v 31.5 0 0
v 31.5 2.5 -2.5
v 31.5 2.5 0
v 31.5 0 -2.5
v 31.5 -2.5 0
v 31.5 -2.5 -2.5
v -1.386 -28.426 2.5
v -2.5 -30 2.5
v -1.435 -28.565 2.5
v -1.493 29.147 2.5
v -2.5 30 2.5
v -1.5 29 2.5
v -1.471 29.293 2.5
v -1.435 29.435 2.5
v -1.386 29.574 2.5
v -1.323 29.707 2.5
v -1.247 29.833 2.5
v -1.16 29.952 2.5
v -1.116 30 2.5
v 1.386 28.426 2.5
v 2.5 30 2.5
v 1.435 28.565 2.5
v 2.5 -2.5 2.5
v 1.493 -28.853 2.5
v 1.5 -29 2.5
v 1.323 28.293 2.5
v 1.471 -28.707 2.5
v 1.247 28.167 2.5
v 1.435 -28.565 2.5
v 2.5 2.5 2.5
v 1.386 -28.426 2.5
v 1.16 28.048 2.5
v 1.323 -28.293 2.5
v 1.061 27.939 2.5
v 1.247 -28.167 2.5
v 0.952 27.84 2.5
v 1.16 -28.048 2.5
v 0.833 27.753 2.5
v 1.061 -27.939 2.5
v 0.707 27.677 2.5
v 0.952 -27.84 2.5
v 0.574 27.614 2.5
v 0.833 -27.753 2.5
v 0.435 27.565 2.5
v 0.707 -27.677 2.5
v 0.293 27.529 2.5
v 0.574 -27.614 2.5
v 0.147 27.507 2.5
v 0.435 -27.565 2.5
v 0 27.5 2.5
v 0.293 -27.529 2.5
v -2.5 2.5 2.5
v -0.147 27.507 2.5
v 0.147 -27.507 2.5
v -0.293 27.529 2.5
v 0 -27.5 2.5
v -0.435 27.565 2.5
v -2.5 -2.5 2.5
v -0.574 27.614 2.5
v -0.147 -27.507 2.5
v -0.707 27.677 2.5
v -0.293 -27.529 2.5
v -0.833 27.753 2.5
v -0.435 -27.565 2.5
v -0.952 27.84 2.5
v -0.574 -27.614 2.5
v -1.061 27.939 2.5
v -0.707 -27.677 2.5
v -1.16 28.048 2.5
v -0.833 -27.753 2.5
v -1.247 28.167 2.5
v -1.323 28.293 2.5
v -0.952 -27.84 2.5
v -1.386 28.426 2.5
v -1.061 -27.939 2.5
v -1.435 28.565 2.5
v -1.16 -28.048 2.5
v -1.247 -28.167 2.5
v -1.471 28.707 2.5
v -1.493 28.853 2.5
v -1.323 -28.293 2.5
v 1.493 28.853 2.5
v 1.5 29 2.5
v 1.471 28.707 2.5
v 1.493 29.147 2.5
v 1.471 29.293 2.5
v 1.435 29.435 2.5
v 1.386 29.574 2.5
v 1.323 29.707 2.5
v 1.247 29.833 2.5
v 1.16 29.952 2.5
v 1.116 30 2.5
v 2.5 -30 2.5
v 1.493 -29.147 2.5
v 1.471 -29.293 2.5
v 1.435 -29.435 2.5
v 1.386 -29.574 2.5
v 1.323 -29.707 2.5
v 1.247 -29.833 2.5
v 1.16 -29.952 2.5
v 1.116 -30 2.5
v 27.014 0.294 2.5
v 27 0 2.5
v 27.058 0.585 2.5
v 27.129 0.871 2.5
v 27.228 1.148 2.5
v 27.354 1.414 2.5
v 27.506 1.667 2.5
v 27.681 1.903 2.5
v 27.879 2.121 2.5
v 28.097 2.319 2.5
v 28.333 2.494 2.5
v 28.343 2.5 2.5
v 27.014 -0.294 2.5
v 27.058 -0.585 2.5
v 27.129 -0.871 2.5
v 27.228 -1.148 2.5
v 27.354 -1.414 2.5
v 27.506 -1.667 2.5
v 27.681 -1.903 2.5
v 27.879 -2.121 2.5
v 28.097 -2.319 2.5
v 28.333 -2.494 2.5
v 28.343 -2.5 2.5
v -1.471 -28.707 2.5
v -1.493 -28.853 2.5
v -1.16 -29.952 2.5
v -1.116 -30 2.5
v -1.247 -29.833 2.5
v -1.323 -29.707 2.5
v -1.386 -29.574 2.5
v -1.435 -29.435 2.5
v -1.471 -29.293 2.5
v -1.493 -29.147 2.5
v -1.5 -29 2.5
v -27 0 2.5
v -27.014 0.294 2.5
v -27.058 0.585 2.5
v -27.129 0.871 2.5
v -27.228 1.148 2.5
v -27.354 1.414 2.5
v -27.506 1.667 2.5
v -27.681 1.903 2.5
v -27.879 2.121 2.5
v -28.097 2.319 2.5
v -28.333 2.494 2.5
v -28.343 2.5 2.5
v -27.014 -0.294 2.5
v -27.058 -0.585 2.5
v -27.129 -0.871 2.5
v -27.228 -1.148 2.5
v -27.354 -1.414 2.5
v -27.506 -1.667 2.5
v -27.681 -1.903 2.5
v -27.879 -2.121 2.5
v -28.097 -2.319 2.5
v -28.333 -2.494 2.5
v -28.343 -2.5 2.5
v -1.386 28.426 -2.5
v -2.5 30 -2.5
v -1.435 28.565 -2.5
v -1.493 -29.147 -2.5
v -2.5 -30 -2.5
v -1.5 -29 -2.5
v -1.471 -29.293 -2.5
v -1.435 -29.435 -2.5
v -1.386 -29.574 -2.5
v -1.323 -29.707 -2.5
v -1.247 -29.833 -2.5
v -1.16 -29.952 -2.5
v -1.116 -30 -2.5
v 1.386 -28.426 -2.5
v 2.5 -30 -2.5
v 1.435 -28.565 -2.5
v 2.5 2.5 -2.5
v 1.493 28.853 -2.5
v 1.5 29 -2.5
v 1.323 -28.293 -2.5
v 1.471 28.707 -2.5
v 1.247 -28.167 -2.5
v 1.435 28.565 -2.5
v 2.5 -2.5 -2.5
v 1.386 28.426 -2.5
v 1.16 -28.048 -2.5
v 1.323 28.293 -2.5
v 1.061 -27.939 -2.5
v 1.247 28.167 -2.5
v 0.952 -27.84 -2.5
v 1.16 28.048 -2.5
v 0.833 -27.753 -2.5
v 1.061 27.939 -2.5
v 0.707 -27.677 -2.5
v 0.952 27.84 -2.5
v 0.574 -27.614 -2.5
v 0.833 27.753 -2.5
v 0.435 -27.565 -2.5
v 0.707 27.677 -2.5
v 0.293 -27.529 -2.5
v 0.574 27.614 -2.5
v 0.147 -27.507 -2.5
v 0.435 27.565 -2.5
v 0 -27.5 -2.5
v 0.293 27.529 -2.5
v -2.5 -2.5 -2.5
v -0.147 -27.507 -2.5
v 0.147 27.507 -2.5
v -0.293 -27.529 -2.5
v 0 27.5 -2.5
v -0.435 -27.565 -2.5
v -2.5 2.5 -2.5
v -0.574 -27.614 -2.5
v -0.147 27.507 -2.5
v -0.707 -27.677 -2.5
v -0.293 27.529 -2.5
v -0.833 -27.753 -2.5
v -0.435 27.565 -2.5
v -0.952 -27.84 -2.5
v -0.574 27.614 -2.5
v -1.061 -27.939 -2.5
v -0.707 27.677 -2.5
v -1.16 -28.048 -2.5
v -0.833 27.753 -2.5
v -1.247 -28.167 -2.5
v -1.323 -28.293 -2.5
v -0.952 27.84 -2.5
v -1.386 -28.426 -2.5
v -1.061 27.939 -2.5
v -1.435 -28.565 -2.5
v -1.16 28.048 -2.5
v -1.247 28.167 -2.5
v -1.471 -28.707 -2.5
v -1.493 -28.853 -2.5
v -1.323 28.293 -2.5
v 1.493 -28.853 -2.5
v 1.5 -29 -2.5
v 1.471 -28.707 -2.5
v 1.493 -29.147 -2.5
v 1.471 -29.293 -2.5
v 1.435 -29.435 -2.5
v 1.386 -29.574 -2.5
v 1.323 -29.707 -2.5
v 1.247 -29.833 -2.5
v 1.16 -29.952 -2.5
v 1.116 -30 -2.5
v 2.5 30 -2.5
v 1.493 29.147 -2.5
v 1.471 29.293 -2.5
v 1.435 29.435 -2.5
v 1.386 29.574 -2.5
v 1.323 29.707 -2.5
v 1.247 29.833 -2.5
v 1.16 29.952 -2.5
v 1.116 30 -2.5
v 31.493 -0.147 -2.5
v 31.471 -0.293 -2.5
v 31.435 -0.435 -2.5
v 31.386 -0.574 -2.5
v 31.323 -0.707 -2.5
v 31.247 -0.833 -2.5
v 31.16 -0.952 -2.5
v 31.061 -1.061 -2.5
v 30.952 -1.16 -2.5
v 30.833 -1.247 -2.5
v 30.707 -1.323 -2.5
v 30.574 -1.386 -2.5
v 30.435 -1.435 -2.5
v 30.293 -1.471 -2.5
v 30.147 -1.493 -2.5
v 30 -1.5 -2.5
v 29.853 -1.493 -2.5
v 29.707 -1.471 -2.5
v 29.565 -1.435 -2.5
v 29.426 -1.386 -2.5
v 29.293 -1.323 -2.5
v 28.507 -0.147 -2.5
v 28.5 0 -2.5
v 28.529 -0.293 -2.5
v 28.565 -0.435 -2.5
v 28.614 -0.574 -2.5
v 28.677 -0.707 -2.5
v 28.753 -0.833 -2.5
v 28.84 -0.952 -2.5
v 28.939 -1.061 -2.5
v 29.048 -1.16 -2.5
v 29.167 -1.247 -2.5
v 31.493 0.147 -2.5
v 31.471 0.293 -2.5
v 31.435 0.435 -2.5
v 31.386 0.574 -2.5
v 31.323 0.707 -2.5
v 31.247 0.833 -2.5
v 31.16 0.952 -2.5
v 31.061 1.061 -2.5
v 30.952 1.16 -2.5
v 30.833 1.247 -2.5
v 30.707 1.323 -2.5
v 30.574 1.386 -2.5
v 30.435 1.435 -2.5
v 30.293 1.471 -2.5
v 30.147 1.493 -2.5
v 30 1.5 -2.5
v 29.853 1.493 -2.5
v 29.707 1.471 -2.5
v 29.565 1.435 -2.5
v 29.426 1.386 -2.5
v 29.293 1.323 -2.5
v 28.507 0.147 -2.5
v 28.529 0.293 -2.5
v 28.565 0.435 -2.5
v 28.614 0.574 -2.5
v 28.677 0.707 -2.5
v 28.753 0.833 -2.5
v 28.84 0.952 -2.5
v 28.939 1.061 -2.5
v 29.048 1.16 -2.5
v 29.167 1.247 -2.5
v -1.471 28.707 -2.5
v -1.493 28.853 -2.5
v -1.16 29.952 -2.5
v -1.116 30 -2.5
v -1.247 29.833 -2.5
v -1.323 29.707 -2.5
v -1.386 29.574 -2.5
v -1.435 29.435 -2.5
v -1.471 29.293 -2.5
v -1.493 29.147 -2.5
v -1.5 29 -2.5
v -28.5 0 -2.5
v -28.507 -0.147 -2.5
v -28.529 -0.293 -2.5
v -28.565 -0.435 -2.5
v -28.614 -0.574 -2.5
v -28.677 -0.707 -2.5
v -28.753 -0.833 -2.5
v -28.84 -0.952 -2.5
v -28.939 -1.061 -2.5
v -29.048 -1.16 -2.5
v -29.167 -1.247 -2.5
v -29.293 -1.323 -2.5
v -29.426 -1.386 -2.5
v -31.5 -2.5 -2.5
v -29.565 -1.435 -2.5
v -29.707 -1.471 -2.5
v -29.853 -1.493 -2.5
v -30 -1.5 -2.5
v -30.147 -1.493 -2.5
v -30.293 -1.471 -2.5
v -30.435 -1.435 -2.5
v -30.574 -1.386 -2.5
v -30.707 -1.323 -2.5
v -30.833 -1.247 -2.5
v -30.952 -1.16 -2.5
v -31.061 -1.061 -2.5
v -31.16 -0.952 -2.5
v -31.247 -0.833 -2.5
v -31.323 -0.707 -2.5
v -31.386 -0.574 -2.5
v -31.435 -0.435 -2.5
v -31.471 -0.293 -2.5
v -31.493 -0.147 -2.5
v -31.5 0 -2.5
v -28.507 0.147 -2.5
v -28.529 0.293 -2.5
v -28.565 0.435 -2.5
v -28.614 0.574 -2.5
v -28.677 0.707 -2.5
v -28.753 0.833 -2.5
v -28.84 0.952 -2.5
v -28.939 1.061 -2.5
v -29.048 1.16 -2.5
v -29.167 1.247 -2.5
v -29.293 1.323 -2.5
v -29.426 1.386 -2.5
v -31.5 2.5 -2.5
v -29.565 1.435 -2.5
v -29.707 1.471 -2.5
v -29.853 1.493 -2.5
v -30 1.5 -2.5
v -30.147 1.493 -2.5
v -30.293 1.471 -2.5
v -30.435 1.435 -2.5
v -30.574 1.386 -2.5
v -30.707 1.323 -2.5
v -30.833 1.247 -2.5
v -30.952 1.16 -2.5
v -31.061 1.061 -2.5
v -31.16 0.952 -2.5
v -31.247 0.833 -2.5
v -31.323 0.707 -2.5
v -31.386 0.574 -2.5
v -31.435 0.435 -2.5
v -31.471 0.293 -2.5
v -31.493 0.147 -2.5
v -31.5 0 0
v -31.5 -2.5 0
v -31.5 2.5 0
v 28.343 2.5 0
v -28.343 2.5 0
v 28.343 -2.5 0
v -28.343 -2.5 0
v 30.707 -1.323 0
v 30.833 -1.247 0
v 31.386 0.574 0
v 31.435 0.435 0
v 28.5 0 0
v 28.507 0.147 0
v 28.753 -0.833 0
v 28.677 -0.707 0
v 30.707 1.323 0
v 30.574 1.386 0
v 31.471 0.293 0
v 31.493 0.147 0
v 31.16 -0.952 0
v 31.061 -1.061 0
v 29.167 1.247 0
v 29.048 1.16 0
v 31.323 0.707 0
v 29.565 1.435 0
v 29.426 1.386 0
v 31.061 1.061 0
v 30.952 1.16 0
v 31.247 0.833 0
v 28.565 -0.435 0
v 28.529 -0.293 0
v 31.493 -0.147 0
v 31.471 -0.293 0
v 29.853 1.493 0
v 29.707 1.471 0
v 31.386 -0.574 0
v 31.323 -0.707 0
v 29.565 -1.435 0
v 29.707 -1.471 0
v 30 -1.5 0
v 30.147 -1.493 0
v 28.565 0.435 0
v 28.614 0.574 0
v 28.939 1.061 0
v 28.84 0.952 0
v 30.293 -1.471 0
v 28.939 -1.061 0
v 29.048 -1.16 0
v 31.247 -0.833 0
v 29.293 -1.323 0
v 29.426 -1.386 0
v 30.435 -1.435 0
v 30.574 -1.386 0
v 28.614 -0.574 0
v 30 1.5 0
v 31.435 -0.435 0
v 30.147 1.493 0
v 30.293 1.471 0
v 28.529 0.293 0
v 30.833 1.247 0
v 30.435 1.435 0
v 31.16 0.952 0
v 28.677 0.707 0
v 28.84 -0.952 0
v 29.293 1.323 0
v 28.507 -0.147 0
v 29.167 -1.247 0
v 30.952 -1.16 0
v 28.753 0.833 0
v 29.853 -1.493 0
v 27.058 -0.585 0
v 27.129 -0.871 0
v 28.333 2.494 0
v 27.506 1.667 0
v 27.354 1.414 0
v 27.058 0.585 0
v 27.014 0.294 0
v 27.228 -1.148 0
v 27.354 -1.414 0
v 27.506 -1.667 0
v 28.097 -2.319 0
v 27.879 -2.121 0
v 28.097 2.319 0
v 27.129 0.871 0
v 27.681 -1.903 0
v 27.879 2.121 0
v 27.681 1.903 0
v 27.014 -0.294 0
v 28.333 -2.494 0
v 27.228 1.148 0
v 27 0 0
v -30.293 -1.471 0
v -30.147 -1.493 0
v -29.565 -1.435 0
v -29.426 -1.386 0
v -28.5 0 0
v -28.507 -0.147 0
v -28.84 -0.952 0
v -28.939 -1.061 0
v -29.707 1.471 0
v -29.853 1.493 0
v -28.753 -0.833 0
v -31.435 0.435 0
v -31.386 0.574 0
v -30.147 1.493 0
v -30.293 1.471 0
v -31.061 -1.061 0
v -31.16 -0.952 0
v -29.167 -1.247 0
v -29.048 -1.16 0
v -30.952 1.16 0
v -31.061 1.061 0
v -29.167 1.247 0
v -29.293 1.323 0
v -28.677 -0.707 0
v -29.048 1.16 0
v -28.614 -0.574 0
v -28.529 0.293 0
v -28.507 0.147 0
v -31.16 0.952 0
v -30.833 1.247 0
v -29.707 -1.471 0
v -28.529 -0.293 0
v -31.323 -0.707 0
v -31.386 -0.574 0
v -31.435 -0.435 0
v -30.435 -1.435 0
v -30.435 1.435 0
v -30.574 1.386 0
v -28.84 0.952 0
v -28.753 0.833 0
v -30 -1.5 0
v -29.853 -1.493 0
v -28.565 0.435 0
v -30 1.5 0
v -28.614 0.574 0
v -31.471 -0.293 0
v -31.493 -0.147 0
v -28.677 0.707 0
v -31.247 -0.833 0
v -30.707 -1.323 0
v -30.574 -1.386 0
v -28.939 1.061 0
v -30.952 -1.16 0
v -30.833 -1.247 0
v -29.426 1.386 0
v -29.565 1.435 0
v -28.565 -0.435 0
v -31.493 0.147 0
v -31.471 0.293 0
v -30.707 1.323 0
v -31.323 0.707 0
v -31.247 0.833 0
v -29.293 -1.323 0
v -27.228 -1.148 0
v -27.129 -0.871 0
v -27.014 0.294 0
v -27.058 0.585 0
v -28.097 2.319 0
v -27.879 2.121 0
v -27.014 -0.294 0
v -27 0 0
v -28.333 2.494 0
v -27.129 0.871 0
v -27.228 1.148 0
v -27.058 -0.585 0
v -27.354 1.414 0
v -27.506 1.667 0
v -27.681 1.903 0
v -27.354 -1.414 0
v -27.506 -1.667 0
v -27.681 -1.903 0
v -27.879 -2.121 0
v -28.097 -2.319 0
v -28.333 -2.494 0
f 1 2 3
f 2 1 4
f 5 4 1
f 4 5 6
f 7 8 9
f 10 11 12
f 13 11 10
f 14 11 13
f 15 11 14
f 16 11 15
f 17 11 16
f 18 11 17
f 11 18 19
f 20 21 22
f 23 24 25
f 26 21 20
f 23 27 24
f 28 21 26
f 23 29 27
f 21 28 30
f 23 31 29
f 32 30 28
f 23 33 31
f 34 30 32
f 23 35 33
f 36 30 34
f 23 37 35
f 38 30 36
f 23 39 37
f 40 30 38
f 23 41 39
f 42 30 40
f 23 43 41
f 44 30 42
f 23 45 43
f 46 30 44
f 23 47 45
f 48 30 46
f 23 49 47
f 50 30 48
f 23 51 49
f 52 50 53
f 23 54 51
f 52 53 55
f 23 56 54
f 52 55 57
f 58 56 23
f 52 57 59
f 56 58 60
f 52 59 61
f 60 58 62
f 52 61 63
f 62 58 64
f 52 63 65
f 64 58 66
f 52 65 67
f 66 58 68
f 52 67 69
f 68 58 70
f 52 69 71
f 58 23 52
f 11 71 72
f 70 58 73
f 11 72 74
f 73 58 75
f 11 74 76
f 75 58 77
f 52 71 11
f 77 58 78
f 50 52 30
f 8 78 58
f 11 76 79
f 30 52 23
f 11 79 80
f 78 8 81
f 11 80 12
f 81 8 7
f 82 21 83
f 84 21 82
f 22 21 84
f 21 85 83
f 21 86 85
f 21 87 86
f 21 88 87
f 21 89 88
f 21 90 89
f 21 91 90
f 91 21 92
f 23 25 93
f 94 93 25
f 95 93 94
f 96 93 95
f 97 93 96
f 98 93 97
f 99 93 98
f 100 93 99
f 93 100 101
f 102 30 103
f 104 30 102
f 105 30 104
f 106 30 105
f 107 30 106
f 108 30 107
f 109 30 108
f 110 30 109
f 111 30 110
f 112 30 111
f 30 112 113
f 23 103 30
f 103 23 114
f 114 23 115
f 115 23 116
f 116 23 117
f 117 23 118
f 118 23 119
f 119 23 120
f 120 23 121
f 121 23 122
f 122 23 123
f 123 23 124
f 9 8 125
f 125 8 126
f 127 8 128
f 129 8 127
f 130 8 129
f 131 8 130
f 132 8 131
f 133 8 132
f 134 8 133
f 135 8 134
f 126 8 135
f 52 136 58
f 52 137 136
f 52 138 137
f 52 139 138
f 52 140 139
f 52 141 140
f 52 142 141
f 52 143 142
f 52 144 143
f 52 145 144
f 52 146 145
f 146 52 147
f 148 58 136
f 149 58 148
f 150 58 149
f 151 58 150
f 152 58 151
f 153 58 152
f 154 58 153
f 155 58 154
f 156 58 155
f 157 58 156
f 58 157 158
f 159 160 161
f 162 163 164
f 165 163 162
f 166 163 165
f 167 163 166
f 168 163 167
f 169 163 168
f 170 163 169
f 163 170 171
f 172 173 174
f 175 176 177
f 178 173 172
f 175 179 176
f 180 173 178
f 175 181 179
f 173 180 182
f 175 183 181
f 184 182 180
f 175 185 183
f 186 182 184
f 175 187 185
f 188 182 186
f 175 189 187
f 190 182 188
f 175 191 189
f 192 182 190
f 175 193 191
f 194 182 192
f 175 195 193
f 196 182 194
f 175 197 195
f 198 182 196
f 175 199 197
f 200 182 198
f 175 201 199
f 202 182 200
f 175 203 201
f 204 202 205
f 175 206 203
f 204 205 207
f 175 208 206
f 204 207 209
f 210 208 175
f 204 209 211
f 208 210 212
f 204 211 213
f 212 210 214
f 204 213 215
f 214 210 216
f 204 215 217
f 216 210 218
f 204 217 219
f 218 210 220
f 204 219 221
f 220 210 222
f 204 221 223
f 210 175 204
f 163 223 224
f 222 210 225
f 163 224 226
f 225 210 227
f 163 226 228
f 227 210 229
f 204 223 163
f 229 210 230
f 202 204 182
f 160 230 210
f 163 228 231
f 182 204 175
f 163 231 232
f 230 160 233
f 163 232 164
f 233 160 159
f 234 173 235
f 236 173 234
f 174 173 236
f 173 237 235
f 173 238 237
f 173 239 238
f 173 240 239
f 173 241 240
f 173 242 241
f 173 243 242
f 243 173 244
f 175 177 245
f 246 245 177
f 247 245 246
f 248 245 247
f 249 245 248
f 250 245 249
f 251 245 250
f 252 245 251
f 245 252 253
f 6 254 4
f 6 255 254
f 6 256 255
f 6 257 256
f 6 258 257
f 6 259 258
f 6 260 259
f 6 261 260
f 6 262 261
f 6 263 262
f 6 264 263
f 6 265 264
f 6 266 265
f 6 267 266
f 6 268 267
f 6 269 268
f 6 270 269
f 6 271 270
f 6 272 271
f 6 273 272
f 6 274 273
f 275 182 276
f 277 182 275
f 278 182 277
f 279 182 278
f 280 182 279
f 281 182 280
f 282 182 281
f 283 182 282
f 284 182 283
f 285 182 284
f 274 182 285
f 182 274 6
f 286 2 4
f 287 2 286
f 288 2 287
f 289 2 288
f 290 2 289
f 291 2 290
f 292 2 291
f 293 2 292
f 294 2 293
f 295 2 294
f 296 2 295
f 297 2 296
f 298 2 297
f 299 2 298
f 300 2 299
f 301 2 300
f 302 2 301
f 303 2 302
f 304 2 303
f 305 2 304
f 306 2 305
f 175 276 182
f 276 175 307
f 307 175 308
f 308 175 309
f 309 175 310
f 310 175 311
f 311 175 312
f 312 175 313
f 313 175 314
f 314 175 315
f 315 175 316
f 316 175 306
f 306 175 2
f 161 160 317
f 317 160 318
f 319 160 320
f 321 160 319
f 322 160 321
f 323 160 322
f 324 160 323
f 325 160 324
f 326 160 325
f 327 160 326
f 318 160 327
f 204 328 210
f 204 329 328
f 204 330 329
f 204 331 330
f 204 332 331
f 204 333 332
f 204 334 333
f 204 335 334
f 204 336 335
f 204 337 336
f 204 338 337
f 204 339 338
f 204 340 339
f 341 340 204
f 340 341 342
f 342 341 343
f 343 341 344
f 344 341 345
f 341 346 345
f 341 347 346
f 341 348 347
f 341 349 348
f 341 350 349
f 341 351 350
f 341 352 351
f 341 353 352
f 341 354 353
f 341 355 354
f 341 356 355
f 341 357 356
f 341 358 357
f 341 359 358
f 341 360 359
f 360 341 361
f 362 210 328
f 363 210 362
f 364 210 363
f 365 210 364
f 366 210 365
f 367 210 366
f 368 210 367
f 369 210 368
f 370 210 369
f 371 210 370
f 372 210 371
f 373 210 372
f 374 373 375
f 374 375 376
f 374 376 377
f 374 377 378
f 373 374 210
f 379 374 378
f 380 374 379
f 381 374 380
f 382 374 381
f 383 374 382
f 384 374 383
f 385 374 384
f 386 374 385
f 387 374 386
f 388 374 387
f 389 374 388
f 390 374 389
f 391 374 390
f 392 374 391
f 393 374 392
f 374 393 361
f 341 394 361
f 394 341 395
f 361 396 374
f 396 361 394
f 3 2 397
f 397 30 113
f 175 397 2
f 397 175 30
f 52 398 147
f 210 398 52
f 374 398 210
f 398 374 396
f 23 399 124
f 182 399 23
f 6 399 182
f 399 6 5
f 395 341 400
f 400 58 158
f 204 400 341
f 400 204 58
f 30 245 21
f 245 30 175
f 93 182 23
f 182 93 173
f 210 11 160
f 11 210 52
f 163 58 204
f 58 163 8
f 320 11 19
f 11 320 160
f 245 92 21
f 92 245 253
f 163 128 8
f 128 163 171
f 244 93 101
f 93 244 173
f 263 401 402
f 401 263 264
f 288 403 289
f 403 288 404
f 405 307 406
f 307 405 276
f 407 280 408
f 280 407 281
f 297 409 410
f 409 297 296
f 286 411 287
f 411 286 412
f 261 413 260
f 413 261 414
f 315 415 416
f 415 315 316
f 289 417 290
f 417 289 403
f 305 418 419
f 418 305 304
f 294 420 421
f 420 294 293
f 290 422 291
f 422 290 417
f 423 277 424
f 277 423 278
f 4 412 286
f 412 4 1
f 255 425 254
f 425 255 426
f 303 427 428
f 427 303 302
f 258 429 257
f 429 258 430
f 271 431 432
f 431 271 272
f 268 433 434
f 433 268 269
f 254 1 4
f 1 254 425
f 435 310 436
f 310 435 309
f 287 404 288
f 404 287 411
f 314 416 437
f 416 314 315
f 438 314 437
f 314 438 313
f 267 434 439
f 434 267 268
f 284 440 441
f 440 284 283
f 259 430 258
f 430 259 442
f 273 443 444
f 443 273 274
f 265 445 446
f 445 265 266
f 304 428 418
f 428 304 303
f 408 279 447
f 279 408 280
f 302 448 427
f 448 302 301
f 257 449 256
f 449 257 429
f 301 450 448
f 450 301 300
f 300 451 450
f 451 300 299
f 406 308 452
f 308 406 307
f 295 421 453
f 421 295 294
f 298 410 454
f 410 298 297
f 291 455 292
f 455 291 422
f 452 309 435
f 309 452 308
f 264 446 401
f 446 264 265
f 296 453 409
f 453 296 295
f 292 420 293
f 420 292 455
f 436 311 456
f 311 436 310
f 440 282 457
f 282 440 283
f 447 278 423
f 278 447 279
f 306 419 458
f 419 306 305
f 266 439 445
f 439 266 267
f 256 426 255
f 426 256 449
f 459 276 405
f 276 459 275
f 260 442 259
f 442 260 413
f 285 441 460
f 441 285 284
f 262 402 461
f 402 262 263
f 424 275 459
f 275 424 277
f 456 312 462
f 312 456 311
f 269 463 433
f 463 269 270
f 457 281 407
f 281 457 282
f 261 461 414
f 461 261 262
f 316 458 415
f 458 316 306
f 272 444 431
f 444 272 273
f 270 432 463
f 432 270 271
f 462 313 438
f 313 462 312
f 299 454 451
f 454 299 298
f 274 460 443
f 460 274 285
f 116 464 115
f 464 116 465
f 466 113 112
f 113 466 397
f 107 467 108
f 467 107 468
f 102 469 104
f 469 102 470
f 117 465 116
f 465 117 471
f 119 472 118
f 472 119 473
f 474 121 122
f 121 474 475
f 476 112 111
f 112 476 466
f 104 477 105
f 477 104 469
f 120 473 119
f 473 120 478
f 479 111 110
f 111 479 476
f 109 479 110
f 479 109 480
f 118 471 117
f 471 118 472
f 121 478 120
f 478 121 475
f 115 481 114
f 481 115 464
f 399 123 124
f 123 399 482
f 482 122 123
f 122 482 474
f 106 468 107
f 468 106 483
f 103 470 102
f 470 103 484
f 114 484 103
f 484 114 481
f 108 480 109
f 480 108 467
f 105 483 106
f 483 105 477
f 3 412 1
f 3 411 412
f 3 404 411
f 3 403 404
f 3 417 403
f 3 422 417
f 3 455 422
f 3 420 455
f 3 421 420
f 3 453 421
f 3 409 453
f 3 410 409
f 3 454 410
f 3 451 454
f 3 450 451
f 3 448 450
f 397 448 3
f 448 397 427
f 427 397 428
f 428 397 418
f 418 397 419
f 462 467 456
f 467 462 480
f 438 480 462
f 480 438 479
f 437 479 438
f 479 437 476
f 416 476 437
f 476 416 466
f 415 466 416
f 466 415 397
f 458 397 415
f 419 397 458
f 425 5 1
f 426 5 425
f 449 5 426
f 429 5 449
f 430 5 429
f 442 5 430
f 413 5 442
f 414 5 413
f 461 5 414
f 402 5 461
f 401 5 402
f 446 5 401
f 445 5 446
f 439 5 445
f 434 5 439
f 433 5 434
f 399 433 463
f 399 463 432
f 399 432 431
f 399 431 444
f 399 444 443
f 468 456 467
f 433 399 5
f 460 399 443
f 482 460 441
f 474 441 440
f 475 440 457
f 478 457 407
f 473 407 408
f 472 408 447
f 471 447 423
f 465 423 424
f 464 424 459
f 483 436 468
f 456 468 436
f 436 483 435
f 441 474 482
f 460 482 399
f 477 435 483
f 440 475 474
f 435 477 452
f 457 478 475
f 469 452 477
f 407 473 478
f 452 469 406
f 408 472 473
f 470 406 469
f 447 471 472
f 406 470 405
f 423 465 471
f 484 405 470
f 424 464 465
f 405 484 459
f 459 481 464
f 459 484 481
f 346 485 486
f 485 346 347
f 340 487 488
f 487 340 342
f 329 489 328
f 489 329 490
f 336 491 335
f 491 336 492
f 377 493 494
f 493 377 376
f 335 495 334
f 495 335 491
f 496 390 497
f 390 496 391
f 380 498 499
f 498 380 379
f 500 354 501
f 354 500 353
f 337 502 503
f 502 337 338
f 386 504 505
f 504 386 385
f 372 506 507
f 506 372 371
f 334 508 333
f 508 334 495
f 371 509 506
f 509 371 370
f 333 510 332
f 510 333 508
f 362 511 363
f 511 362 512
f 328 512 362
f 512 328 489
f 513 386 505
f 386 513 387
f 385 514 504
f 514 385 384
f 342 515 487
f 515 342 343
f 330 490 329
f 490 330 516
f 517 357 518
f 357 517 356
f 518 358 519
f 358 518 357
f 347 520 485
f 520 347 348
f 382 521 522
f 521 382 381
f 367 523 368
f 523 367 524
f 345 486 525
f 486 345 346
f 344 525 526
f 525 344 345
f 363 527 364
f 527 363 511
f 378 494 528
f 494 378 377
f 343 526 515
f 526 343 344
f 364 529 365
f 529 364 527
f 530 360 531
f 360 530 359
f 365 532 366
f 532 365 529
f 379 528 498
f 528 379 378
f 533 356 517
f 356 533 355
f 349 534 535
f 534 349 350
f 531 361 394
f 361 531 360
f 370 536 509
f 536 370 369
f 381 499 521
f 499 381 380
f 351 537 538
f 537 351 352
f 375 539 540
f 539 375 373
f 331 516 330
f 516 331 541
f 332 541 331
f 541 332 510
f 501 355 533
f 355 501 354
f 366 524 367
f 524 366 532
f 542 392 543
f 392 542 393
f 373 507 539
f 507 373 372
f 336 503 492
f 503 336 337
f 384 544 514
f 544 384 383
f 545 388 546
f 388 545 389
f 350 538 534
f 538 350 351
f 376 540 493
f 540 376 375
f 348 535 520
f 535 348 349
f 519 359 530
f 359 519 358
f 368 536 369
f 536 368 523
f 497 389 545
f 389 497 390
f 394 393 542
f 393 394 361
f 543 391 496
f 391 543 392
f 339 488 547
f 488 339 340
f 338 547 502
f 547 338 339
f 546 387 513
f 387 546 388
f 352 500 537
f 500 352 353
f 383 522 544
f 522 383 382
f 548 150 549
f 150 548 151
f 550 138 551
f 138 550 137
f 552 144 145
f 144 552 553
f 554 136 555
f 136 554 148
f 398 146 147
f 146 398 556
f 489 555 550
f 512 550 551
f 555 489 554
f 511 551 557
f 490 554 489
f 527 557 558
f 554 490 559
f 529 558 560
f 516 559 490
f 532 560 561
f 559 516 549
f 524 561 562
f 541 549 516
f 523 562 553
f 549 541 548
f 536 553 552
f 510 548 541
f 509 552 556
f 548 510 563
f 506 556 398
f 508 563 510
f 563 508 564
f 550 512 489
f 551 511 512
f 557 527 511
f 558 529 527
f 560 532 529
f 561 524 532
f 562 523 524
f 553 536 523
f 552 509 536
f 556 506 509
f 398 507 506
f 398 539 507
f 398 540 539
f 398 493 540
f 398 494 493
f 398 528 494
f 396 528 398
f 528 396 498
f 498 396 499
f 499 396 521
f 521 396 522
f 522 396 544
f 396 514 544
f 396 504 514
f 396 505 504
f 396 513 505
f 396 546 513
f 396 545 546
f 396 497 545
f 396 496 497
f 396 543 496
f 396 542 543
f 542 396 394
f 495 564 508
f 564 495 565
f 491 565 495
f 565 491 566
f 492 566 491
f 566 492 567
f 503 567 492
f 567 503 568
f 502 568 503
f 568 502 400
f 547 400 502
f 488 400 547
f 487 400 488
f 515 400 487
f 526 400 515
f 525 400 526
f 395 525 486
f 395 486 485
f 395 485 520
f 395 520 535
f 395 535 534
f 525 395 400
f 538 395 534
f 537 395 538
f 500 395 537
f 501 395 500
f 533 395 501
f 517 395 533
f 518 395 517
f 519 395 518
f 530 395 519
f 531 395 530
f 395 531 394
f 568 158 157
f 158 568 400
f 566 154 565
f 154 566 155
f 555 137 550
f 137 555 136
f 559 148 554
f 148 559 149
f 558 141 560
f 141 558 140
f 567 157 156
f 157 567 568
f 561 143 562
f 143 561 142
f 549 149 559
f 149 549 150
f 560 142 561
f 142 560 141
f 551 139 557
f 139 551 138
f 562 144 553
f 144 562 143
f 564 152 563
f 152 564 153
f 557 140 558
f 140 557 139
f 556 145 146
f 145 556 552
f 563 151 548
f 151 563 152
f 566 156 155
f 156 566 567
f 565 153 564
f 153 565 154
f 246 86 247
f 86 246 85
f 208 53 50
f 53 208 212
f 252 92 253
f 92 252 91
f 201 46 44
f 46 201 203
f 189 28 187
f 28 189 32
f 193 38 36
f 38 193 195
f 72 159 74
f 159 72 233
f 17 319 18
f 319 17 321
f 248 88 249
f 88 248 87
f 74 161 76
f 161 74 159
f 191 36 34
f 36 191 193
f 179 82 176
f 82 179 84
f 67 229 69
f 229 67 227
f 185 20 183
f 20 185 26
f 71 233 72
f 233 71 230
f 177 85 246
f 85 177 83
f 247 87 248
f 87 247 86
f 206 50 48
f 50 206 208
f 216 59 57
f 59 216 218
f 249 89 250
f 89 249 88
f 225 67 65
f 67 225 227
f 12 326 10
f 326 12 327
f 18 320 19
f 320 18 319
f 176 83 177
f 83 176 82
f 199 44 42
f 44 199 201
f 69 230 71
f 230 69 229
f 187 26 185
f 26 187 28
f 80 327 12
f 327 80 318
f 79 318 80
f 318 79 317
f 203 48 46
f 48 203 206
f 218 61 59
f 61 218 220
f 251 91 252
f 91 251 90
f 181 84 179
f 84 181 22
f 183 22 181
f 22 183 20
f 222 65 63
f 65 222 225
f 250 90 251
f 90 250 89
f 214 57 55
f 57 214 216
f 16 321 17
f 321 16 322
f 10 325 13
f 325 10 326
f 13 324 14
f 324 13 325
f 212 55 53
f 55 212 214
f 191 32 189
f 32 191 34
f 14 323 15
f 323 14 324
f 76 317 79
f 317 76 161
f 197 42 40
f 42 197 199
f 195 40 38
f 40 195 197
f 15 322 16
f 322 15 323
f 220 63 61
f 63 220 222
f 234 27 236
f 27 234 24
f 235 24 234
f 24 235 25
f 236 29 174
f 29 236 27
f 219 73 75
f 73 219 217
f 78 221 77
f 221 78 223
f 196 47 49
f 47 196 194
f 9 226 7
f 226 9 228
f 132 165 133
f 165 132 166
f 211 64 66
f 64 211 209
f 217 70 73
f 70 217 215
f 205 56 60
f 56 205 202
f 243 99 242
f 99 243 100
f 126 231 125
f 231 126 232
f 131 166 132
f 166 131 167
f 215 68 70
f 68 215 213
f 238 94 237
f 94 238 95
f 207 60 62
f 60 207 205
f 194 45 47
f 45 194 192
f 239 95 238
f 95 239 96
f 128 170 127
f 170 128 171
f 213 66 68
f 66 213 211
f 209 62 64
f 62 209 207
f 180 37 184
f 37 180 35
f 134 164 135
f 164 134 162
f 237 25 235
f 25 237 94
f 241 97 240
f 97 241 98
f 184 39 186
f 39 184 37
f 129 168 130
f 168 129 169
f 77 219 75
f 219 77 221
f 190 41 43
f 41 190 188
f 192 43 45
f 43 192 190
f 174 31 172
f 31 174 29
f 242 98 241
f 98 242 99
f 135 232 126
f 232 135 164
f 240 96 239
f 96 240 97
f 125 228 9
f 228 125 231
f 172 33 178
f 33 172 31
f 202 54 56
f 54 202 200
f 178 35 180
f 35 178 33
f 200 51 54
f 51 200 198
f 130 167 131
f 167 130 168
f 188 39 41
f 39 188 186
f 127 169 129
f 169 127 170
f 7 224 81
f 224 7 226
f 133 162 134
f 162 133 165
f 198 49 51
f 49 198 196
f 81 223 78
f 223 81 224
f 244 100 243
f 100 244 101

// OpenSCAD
// einzel-dosen-hue-dimmer-halter
// unterputzdose hat schraublöcher oben und unten, 60mm auseinander

 $fn=64;
 /*
 difference(){
     union(){
        difference(){
            union(){
                cylinder(r=31, h=10);
            }
            
            translate([0,0,-1])
            cylinder(r=29, h=12);
        }
            translate([0,0,1.5])
            cube([58, 5, 3], center=true);
    }

    translate([58/2, 0, -5])
    cylinder(r=1.5, h=10);
    
    translate([-58/2, 0, -5])
    cylinder(r=1.5, h=10);    
}
*/

difference(){
    union(){
        cube([60+3, 5, 5], center=true);
        cube([5, 60, 5], center=true);
    }
    
    // dosen-schrauben
    translate([30,0,-5])
    cylinder(r=1.5, h=10);
    
    translate([30,0,-0])
    cylinder(r=3, h=10);    
    
    translate([-30,0,-5])
    cylinder(r=1.5, h=10);  
  
    translate([-30,0,-0])
    cylinder(r=3, h=10);    
    
    // löcher für hue-schalter
    translate([0,58/2,-5])
    cylinder(r=1.5, h=10);    
    
    // löcher für hue-schalter
    translate([0,-58/2,-5])
    cylinder(r=1.5, h=10);        
}
